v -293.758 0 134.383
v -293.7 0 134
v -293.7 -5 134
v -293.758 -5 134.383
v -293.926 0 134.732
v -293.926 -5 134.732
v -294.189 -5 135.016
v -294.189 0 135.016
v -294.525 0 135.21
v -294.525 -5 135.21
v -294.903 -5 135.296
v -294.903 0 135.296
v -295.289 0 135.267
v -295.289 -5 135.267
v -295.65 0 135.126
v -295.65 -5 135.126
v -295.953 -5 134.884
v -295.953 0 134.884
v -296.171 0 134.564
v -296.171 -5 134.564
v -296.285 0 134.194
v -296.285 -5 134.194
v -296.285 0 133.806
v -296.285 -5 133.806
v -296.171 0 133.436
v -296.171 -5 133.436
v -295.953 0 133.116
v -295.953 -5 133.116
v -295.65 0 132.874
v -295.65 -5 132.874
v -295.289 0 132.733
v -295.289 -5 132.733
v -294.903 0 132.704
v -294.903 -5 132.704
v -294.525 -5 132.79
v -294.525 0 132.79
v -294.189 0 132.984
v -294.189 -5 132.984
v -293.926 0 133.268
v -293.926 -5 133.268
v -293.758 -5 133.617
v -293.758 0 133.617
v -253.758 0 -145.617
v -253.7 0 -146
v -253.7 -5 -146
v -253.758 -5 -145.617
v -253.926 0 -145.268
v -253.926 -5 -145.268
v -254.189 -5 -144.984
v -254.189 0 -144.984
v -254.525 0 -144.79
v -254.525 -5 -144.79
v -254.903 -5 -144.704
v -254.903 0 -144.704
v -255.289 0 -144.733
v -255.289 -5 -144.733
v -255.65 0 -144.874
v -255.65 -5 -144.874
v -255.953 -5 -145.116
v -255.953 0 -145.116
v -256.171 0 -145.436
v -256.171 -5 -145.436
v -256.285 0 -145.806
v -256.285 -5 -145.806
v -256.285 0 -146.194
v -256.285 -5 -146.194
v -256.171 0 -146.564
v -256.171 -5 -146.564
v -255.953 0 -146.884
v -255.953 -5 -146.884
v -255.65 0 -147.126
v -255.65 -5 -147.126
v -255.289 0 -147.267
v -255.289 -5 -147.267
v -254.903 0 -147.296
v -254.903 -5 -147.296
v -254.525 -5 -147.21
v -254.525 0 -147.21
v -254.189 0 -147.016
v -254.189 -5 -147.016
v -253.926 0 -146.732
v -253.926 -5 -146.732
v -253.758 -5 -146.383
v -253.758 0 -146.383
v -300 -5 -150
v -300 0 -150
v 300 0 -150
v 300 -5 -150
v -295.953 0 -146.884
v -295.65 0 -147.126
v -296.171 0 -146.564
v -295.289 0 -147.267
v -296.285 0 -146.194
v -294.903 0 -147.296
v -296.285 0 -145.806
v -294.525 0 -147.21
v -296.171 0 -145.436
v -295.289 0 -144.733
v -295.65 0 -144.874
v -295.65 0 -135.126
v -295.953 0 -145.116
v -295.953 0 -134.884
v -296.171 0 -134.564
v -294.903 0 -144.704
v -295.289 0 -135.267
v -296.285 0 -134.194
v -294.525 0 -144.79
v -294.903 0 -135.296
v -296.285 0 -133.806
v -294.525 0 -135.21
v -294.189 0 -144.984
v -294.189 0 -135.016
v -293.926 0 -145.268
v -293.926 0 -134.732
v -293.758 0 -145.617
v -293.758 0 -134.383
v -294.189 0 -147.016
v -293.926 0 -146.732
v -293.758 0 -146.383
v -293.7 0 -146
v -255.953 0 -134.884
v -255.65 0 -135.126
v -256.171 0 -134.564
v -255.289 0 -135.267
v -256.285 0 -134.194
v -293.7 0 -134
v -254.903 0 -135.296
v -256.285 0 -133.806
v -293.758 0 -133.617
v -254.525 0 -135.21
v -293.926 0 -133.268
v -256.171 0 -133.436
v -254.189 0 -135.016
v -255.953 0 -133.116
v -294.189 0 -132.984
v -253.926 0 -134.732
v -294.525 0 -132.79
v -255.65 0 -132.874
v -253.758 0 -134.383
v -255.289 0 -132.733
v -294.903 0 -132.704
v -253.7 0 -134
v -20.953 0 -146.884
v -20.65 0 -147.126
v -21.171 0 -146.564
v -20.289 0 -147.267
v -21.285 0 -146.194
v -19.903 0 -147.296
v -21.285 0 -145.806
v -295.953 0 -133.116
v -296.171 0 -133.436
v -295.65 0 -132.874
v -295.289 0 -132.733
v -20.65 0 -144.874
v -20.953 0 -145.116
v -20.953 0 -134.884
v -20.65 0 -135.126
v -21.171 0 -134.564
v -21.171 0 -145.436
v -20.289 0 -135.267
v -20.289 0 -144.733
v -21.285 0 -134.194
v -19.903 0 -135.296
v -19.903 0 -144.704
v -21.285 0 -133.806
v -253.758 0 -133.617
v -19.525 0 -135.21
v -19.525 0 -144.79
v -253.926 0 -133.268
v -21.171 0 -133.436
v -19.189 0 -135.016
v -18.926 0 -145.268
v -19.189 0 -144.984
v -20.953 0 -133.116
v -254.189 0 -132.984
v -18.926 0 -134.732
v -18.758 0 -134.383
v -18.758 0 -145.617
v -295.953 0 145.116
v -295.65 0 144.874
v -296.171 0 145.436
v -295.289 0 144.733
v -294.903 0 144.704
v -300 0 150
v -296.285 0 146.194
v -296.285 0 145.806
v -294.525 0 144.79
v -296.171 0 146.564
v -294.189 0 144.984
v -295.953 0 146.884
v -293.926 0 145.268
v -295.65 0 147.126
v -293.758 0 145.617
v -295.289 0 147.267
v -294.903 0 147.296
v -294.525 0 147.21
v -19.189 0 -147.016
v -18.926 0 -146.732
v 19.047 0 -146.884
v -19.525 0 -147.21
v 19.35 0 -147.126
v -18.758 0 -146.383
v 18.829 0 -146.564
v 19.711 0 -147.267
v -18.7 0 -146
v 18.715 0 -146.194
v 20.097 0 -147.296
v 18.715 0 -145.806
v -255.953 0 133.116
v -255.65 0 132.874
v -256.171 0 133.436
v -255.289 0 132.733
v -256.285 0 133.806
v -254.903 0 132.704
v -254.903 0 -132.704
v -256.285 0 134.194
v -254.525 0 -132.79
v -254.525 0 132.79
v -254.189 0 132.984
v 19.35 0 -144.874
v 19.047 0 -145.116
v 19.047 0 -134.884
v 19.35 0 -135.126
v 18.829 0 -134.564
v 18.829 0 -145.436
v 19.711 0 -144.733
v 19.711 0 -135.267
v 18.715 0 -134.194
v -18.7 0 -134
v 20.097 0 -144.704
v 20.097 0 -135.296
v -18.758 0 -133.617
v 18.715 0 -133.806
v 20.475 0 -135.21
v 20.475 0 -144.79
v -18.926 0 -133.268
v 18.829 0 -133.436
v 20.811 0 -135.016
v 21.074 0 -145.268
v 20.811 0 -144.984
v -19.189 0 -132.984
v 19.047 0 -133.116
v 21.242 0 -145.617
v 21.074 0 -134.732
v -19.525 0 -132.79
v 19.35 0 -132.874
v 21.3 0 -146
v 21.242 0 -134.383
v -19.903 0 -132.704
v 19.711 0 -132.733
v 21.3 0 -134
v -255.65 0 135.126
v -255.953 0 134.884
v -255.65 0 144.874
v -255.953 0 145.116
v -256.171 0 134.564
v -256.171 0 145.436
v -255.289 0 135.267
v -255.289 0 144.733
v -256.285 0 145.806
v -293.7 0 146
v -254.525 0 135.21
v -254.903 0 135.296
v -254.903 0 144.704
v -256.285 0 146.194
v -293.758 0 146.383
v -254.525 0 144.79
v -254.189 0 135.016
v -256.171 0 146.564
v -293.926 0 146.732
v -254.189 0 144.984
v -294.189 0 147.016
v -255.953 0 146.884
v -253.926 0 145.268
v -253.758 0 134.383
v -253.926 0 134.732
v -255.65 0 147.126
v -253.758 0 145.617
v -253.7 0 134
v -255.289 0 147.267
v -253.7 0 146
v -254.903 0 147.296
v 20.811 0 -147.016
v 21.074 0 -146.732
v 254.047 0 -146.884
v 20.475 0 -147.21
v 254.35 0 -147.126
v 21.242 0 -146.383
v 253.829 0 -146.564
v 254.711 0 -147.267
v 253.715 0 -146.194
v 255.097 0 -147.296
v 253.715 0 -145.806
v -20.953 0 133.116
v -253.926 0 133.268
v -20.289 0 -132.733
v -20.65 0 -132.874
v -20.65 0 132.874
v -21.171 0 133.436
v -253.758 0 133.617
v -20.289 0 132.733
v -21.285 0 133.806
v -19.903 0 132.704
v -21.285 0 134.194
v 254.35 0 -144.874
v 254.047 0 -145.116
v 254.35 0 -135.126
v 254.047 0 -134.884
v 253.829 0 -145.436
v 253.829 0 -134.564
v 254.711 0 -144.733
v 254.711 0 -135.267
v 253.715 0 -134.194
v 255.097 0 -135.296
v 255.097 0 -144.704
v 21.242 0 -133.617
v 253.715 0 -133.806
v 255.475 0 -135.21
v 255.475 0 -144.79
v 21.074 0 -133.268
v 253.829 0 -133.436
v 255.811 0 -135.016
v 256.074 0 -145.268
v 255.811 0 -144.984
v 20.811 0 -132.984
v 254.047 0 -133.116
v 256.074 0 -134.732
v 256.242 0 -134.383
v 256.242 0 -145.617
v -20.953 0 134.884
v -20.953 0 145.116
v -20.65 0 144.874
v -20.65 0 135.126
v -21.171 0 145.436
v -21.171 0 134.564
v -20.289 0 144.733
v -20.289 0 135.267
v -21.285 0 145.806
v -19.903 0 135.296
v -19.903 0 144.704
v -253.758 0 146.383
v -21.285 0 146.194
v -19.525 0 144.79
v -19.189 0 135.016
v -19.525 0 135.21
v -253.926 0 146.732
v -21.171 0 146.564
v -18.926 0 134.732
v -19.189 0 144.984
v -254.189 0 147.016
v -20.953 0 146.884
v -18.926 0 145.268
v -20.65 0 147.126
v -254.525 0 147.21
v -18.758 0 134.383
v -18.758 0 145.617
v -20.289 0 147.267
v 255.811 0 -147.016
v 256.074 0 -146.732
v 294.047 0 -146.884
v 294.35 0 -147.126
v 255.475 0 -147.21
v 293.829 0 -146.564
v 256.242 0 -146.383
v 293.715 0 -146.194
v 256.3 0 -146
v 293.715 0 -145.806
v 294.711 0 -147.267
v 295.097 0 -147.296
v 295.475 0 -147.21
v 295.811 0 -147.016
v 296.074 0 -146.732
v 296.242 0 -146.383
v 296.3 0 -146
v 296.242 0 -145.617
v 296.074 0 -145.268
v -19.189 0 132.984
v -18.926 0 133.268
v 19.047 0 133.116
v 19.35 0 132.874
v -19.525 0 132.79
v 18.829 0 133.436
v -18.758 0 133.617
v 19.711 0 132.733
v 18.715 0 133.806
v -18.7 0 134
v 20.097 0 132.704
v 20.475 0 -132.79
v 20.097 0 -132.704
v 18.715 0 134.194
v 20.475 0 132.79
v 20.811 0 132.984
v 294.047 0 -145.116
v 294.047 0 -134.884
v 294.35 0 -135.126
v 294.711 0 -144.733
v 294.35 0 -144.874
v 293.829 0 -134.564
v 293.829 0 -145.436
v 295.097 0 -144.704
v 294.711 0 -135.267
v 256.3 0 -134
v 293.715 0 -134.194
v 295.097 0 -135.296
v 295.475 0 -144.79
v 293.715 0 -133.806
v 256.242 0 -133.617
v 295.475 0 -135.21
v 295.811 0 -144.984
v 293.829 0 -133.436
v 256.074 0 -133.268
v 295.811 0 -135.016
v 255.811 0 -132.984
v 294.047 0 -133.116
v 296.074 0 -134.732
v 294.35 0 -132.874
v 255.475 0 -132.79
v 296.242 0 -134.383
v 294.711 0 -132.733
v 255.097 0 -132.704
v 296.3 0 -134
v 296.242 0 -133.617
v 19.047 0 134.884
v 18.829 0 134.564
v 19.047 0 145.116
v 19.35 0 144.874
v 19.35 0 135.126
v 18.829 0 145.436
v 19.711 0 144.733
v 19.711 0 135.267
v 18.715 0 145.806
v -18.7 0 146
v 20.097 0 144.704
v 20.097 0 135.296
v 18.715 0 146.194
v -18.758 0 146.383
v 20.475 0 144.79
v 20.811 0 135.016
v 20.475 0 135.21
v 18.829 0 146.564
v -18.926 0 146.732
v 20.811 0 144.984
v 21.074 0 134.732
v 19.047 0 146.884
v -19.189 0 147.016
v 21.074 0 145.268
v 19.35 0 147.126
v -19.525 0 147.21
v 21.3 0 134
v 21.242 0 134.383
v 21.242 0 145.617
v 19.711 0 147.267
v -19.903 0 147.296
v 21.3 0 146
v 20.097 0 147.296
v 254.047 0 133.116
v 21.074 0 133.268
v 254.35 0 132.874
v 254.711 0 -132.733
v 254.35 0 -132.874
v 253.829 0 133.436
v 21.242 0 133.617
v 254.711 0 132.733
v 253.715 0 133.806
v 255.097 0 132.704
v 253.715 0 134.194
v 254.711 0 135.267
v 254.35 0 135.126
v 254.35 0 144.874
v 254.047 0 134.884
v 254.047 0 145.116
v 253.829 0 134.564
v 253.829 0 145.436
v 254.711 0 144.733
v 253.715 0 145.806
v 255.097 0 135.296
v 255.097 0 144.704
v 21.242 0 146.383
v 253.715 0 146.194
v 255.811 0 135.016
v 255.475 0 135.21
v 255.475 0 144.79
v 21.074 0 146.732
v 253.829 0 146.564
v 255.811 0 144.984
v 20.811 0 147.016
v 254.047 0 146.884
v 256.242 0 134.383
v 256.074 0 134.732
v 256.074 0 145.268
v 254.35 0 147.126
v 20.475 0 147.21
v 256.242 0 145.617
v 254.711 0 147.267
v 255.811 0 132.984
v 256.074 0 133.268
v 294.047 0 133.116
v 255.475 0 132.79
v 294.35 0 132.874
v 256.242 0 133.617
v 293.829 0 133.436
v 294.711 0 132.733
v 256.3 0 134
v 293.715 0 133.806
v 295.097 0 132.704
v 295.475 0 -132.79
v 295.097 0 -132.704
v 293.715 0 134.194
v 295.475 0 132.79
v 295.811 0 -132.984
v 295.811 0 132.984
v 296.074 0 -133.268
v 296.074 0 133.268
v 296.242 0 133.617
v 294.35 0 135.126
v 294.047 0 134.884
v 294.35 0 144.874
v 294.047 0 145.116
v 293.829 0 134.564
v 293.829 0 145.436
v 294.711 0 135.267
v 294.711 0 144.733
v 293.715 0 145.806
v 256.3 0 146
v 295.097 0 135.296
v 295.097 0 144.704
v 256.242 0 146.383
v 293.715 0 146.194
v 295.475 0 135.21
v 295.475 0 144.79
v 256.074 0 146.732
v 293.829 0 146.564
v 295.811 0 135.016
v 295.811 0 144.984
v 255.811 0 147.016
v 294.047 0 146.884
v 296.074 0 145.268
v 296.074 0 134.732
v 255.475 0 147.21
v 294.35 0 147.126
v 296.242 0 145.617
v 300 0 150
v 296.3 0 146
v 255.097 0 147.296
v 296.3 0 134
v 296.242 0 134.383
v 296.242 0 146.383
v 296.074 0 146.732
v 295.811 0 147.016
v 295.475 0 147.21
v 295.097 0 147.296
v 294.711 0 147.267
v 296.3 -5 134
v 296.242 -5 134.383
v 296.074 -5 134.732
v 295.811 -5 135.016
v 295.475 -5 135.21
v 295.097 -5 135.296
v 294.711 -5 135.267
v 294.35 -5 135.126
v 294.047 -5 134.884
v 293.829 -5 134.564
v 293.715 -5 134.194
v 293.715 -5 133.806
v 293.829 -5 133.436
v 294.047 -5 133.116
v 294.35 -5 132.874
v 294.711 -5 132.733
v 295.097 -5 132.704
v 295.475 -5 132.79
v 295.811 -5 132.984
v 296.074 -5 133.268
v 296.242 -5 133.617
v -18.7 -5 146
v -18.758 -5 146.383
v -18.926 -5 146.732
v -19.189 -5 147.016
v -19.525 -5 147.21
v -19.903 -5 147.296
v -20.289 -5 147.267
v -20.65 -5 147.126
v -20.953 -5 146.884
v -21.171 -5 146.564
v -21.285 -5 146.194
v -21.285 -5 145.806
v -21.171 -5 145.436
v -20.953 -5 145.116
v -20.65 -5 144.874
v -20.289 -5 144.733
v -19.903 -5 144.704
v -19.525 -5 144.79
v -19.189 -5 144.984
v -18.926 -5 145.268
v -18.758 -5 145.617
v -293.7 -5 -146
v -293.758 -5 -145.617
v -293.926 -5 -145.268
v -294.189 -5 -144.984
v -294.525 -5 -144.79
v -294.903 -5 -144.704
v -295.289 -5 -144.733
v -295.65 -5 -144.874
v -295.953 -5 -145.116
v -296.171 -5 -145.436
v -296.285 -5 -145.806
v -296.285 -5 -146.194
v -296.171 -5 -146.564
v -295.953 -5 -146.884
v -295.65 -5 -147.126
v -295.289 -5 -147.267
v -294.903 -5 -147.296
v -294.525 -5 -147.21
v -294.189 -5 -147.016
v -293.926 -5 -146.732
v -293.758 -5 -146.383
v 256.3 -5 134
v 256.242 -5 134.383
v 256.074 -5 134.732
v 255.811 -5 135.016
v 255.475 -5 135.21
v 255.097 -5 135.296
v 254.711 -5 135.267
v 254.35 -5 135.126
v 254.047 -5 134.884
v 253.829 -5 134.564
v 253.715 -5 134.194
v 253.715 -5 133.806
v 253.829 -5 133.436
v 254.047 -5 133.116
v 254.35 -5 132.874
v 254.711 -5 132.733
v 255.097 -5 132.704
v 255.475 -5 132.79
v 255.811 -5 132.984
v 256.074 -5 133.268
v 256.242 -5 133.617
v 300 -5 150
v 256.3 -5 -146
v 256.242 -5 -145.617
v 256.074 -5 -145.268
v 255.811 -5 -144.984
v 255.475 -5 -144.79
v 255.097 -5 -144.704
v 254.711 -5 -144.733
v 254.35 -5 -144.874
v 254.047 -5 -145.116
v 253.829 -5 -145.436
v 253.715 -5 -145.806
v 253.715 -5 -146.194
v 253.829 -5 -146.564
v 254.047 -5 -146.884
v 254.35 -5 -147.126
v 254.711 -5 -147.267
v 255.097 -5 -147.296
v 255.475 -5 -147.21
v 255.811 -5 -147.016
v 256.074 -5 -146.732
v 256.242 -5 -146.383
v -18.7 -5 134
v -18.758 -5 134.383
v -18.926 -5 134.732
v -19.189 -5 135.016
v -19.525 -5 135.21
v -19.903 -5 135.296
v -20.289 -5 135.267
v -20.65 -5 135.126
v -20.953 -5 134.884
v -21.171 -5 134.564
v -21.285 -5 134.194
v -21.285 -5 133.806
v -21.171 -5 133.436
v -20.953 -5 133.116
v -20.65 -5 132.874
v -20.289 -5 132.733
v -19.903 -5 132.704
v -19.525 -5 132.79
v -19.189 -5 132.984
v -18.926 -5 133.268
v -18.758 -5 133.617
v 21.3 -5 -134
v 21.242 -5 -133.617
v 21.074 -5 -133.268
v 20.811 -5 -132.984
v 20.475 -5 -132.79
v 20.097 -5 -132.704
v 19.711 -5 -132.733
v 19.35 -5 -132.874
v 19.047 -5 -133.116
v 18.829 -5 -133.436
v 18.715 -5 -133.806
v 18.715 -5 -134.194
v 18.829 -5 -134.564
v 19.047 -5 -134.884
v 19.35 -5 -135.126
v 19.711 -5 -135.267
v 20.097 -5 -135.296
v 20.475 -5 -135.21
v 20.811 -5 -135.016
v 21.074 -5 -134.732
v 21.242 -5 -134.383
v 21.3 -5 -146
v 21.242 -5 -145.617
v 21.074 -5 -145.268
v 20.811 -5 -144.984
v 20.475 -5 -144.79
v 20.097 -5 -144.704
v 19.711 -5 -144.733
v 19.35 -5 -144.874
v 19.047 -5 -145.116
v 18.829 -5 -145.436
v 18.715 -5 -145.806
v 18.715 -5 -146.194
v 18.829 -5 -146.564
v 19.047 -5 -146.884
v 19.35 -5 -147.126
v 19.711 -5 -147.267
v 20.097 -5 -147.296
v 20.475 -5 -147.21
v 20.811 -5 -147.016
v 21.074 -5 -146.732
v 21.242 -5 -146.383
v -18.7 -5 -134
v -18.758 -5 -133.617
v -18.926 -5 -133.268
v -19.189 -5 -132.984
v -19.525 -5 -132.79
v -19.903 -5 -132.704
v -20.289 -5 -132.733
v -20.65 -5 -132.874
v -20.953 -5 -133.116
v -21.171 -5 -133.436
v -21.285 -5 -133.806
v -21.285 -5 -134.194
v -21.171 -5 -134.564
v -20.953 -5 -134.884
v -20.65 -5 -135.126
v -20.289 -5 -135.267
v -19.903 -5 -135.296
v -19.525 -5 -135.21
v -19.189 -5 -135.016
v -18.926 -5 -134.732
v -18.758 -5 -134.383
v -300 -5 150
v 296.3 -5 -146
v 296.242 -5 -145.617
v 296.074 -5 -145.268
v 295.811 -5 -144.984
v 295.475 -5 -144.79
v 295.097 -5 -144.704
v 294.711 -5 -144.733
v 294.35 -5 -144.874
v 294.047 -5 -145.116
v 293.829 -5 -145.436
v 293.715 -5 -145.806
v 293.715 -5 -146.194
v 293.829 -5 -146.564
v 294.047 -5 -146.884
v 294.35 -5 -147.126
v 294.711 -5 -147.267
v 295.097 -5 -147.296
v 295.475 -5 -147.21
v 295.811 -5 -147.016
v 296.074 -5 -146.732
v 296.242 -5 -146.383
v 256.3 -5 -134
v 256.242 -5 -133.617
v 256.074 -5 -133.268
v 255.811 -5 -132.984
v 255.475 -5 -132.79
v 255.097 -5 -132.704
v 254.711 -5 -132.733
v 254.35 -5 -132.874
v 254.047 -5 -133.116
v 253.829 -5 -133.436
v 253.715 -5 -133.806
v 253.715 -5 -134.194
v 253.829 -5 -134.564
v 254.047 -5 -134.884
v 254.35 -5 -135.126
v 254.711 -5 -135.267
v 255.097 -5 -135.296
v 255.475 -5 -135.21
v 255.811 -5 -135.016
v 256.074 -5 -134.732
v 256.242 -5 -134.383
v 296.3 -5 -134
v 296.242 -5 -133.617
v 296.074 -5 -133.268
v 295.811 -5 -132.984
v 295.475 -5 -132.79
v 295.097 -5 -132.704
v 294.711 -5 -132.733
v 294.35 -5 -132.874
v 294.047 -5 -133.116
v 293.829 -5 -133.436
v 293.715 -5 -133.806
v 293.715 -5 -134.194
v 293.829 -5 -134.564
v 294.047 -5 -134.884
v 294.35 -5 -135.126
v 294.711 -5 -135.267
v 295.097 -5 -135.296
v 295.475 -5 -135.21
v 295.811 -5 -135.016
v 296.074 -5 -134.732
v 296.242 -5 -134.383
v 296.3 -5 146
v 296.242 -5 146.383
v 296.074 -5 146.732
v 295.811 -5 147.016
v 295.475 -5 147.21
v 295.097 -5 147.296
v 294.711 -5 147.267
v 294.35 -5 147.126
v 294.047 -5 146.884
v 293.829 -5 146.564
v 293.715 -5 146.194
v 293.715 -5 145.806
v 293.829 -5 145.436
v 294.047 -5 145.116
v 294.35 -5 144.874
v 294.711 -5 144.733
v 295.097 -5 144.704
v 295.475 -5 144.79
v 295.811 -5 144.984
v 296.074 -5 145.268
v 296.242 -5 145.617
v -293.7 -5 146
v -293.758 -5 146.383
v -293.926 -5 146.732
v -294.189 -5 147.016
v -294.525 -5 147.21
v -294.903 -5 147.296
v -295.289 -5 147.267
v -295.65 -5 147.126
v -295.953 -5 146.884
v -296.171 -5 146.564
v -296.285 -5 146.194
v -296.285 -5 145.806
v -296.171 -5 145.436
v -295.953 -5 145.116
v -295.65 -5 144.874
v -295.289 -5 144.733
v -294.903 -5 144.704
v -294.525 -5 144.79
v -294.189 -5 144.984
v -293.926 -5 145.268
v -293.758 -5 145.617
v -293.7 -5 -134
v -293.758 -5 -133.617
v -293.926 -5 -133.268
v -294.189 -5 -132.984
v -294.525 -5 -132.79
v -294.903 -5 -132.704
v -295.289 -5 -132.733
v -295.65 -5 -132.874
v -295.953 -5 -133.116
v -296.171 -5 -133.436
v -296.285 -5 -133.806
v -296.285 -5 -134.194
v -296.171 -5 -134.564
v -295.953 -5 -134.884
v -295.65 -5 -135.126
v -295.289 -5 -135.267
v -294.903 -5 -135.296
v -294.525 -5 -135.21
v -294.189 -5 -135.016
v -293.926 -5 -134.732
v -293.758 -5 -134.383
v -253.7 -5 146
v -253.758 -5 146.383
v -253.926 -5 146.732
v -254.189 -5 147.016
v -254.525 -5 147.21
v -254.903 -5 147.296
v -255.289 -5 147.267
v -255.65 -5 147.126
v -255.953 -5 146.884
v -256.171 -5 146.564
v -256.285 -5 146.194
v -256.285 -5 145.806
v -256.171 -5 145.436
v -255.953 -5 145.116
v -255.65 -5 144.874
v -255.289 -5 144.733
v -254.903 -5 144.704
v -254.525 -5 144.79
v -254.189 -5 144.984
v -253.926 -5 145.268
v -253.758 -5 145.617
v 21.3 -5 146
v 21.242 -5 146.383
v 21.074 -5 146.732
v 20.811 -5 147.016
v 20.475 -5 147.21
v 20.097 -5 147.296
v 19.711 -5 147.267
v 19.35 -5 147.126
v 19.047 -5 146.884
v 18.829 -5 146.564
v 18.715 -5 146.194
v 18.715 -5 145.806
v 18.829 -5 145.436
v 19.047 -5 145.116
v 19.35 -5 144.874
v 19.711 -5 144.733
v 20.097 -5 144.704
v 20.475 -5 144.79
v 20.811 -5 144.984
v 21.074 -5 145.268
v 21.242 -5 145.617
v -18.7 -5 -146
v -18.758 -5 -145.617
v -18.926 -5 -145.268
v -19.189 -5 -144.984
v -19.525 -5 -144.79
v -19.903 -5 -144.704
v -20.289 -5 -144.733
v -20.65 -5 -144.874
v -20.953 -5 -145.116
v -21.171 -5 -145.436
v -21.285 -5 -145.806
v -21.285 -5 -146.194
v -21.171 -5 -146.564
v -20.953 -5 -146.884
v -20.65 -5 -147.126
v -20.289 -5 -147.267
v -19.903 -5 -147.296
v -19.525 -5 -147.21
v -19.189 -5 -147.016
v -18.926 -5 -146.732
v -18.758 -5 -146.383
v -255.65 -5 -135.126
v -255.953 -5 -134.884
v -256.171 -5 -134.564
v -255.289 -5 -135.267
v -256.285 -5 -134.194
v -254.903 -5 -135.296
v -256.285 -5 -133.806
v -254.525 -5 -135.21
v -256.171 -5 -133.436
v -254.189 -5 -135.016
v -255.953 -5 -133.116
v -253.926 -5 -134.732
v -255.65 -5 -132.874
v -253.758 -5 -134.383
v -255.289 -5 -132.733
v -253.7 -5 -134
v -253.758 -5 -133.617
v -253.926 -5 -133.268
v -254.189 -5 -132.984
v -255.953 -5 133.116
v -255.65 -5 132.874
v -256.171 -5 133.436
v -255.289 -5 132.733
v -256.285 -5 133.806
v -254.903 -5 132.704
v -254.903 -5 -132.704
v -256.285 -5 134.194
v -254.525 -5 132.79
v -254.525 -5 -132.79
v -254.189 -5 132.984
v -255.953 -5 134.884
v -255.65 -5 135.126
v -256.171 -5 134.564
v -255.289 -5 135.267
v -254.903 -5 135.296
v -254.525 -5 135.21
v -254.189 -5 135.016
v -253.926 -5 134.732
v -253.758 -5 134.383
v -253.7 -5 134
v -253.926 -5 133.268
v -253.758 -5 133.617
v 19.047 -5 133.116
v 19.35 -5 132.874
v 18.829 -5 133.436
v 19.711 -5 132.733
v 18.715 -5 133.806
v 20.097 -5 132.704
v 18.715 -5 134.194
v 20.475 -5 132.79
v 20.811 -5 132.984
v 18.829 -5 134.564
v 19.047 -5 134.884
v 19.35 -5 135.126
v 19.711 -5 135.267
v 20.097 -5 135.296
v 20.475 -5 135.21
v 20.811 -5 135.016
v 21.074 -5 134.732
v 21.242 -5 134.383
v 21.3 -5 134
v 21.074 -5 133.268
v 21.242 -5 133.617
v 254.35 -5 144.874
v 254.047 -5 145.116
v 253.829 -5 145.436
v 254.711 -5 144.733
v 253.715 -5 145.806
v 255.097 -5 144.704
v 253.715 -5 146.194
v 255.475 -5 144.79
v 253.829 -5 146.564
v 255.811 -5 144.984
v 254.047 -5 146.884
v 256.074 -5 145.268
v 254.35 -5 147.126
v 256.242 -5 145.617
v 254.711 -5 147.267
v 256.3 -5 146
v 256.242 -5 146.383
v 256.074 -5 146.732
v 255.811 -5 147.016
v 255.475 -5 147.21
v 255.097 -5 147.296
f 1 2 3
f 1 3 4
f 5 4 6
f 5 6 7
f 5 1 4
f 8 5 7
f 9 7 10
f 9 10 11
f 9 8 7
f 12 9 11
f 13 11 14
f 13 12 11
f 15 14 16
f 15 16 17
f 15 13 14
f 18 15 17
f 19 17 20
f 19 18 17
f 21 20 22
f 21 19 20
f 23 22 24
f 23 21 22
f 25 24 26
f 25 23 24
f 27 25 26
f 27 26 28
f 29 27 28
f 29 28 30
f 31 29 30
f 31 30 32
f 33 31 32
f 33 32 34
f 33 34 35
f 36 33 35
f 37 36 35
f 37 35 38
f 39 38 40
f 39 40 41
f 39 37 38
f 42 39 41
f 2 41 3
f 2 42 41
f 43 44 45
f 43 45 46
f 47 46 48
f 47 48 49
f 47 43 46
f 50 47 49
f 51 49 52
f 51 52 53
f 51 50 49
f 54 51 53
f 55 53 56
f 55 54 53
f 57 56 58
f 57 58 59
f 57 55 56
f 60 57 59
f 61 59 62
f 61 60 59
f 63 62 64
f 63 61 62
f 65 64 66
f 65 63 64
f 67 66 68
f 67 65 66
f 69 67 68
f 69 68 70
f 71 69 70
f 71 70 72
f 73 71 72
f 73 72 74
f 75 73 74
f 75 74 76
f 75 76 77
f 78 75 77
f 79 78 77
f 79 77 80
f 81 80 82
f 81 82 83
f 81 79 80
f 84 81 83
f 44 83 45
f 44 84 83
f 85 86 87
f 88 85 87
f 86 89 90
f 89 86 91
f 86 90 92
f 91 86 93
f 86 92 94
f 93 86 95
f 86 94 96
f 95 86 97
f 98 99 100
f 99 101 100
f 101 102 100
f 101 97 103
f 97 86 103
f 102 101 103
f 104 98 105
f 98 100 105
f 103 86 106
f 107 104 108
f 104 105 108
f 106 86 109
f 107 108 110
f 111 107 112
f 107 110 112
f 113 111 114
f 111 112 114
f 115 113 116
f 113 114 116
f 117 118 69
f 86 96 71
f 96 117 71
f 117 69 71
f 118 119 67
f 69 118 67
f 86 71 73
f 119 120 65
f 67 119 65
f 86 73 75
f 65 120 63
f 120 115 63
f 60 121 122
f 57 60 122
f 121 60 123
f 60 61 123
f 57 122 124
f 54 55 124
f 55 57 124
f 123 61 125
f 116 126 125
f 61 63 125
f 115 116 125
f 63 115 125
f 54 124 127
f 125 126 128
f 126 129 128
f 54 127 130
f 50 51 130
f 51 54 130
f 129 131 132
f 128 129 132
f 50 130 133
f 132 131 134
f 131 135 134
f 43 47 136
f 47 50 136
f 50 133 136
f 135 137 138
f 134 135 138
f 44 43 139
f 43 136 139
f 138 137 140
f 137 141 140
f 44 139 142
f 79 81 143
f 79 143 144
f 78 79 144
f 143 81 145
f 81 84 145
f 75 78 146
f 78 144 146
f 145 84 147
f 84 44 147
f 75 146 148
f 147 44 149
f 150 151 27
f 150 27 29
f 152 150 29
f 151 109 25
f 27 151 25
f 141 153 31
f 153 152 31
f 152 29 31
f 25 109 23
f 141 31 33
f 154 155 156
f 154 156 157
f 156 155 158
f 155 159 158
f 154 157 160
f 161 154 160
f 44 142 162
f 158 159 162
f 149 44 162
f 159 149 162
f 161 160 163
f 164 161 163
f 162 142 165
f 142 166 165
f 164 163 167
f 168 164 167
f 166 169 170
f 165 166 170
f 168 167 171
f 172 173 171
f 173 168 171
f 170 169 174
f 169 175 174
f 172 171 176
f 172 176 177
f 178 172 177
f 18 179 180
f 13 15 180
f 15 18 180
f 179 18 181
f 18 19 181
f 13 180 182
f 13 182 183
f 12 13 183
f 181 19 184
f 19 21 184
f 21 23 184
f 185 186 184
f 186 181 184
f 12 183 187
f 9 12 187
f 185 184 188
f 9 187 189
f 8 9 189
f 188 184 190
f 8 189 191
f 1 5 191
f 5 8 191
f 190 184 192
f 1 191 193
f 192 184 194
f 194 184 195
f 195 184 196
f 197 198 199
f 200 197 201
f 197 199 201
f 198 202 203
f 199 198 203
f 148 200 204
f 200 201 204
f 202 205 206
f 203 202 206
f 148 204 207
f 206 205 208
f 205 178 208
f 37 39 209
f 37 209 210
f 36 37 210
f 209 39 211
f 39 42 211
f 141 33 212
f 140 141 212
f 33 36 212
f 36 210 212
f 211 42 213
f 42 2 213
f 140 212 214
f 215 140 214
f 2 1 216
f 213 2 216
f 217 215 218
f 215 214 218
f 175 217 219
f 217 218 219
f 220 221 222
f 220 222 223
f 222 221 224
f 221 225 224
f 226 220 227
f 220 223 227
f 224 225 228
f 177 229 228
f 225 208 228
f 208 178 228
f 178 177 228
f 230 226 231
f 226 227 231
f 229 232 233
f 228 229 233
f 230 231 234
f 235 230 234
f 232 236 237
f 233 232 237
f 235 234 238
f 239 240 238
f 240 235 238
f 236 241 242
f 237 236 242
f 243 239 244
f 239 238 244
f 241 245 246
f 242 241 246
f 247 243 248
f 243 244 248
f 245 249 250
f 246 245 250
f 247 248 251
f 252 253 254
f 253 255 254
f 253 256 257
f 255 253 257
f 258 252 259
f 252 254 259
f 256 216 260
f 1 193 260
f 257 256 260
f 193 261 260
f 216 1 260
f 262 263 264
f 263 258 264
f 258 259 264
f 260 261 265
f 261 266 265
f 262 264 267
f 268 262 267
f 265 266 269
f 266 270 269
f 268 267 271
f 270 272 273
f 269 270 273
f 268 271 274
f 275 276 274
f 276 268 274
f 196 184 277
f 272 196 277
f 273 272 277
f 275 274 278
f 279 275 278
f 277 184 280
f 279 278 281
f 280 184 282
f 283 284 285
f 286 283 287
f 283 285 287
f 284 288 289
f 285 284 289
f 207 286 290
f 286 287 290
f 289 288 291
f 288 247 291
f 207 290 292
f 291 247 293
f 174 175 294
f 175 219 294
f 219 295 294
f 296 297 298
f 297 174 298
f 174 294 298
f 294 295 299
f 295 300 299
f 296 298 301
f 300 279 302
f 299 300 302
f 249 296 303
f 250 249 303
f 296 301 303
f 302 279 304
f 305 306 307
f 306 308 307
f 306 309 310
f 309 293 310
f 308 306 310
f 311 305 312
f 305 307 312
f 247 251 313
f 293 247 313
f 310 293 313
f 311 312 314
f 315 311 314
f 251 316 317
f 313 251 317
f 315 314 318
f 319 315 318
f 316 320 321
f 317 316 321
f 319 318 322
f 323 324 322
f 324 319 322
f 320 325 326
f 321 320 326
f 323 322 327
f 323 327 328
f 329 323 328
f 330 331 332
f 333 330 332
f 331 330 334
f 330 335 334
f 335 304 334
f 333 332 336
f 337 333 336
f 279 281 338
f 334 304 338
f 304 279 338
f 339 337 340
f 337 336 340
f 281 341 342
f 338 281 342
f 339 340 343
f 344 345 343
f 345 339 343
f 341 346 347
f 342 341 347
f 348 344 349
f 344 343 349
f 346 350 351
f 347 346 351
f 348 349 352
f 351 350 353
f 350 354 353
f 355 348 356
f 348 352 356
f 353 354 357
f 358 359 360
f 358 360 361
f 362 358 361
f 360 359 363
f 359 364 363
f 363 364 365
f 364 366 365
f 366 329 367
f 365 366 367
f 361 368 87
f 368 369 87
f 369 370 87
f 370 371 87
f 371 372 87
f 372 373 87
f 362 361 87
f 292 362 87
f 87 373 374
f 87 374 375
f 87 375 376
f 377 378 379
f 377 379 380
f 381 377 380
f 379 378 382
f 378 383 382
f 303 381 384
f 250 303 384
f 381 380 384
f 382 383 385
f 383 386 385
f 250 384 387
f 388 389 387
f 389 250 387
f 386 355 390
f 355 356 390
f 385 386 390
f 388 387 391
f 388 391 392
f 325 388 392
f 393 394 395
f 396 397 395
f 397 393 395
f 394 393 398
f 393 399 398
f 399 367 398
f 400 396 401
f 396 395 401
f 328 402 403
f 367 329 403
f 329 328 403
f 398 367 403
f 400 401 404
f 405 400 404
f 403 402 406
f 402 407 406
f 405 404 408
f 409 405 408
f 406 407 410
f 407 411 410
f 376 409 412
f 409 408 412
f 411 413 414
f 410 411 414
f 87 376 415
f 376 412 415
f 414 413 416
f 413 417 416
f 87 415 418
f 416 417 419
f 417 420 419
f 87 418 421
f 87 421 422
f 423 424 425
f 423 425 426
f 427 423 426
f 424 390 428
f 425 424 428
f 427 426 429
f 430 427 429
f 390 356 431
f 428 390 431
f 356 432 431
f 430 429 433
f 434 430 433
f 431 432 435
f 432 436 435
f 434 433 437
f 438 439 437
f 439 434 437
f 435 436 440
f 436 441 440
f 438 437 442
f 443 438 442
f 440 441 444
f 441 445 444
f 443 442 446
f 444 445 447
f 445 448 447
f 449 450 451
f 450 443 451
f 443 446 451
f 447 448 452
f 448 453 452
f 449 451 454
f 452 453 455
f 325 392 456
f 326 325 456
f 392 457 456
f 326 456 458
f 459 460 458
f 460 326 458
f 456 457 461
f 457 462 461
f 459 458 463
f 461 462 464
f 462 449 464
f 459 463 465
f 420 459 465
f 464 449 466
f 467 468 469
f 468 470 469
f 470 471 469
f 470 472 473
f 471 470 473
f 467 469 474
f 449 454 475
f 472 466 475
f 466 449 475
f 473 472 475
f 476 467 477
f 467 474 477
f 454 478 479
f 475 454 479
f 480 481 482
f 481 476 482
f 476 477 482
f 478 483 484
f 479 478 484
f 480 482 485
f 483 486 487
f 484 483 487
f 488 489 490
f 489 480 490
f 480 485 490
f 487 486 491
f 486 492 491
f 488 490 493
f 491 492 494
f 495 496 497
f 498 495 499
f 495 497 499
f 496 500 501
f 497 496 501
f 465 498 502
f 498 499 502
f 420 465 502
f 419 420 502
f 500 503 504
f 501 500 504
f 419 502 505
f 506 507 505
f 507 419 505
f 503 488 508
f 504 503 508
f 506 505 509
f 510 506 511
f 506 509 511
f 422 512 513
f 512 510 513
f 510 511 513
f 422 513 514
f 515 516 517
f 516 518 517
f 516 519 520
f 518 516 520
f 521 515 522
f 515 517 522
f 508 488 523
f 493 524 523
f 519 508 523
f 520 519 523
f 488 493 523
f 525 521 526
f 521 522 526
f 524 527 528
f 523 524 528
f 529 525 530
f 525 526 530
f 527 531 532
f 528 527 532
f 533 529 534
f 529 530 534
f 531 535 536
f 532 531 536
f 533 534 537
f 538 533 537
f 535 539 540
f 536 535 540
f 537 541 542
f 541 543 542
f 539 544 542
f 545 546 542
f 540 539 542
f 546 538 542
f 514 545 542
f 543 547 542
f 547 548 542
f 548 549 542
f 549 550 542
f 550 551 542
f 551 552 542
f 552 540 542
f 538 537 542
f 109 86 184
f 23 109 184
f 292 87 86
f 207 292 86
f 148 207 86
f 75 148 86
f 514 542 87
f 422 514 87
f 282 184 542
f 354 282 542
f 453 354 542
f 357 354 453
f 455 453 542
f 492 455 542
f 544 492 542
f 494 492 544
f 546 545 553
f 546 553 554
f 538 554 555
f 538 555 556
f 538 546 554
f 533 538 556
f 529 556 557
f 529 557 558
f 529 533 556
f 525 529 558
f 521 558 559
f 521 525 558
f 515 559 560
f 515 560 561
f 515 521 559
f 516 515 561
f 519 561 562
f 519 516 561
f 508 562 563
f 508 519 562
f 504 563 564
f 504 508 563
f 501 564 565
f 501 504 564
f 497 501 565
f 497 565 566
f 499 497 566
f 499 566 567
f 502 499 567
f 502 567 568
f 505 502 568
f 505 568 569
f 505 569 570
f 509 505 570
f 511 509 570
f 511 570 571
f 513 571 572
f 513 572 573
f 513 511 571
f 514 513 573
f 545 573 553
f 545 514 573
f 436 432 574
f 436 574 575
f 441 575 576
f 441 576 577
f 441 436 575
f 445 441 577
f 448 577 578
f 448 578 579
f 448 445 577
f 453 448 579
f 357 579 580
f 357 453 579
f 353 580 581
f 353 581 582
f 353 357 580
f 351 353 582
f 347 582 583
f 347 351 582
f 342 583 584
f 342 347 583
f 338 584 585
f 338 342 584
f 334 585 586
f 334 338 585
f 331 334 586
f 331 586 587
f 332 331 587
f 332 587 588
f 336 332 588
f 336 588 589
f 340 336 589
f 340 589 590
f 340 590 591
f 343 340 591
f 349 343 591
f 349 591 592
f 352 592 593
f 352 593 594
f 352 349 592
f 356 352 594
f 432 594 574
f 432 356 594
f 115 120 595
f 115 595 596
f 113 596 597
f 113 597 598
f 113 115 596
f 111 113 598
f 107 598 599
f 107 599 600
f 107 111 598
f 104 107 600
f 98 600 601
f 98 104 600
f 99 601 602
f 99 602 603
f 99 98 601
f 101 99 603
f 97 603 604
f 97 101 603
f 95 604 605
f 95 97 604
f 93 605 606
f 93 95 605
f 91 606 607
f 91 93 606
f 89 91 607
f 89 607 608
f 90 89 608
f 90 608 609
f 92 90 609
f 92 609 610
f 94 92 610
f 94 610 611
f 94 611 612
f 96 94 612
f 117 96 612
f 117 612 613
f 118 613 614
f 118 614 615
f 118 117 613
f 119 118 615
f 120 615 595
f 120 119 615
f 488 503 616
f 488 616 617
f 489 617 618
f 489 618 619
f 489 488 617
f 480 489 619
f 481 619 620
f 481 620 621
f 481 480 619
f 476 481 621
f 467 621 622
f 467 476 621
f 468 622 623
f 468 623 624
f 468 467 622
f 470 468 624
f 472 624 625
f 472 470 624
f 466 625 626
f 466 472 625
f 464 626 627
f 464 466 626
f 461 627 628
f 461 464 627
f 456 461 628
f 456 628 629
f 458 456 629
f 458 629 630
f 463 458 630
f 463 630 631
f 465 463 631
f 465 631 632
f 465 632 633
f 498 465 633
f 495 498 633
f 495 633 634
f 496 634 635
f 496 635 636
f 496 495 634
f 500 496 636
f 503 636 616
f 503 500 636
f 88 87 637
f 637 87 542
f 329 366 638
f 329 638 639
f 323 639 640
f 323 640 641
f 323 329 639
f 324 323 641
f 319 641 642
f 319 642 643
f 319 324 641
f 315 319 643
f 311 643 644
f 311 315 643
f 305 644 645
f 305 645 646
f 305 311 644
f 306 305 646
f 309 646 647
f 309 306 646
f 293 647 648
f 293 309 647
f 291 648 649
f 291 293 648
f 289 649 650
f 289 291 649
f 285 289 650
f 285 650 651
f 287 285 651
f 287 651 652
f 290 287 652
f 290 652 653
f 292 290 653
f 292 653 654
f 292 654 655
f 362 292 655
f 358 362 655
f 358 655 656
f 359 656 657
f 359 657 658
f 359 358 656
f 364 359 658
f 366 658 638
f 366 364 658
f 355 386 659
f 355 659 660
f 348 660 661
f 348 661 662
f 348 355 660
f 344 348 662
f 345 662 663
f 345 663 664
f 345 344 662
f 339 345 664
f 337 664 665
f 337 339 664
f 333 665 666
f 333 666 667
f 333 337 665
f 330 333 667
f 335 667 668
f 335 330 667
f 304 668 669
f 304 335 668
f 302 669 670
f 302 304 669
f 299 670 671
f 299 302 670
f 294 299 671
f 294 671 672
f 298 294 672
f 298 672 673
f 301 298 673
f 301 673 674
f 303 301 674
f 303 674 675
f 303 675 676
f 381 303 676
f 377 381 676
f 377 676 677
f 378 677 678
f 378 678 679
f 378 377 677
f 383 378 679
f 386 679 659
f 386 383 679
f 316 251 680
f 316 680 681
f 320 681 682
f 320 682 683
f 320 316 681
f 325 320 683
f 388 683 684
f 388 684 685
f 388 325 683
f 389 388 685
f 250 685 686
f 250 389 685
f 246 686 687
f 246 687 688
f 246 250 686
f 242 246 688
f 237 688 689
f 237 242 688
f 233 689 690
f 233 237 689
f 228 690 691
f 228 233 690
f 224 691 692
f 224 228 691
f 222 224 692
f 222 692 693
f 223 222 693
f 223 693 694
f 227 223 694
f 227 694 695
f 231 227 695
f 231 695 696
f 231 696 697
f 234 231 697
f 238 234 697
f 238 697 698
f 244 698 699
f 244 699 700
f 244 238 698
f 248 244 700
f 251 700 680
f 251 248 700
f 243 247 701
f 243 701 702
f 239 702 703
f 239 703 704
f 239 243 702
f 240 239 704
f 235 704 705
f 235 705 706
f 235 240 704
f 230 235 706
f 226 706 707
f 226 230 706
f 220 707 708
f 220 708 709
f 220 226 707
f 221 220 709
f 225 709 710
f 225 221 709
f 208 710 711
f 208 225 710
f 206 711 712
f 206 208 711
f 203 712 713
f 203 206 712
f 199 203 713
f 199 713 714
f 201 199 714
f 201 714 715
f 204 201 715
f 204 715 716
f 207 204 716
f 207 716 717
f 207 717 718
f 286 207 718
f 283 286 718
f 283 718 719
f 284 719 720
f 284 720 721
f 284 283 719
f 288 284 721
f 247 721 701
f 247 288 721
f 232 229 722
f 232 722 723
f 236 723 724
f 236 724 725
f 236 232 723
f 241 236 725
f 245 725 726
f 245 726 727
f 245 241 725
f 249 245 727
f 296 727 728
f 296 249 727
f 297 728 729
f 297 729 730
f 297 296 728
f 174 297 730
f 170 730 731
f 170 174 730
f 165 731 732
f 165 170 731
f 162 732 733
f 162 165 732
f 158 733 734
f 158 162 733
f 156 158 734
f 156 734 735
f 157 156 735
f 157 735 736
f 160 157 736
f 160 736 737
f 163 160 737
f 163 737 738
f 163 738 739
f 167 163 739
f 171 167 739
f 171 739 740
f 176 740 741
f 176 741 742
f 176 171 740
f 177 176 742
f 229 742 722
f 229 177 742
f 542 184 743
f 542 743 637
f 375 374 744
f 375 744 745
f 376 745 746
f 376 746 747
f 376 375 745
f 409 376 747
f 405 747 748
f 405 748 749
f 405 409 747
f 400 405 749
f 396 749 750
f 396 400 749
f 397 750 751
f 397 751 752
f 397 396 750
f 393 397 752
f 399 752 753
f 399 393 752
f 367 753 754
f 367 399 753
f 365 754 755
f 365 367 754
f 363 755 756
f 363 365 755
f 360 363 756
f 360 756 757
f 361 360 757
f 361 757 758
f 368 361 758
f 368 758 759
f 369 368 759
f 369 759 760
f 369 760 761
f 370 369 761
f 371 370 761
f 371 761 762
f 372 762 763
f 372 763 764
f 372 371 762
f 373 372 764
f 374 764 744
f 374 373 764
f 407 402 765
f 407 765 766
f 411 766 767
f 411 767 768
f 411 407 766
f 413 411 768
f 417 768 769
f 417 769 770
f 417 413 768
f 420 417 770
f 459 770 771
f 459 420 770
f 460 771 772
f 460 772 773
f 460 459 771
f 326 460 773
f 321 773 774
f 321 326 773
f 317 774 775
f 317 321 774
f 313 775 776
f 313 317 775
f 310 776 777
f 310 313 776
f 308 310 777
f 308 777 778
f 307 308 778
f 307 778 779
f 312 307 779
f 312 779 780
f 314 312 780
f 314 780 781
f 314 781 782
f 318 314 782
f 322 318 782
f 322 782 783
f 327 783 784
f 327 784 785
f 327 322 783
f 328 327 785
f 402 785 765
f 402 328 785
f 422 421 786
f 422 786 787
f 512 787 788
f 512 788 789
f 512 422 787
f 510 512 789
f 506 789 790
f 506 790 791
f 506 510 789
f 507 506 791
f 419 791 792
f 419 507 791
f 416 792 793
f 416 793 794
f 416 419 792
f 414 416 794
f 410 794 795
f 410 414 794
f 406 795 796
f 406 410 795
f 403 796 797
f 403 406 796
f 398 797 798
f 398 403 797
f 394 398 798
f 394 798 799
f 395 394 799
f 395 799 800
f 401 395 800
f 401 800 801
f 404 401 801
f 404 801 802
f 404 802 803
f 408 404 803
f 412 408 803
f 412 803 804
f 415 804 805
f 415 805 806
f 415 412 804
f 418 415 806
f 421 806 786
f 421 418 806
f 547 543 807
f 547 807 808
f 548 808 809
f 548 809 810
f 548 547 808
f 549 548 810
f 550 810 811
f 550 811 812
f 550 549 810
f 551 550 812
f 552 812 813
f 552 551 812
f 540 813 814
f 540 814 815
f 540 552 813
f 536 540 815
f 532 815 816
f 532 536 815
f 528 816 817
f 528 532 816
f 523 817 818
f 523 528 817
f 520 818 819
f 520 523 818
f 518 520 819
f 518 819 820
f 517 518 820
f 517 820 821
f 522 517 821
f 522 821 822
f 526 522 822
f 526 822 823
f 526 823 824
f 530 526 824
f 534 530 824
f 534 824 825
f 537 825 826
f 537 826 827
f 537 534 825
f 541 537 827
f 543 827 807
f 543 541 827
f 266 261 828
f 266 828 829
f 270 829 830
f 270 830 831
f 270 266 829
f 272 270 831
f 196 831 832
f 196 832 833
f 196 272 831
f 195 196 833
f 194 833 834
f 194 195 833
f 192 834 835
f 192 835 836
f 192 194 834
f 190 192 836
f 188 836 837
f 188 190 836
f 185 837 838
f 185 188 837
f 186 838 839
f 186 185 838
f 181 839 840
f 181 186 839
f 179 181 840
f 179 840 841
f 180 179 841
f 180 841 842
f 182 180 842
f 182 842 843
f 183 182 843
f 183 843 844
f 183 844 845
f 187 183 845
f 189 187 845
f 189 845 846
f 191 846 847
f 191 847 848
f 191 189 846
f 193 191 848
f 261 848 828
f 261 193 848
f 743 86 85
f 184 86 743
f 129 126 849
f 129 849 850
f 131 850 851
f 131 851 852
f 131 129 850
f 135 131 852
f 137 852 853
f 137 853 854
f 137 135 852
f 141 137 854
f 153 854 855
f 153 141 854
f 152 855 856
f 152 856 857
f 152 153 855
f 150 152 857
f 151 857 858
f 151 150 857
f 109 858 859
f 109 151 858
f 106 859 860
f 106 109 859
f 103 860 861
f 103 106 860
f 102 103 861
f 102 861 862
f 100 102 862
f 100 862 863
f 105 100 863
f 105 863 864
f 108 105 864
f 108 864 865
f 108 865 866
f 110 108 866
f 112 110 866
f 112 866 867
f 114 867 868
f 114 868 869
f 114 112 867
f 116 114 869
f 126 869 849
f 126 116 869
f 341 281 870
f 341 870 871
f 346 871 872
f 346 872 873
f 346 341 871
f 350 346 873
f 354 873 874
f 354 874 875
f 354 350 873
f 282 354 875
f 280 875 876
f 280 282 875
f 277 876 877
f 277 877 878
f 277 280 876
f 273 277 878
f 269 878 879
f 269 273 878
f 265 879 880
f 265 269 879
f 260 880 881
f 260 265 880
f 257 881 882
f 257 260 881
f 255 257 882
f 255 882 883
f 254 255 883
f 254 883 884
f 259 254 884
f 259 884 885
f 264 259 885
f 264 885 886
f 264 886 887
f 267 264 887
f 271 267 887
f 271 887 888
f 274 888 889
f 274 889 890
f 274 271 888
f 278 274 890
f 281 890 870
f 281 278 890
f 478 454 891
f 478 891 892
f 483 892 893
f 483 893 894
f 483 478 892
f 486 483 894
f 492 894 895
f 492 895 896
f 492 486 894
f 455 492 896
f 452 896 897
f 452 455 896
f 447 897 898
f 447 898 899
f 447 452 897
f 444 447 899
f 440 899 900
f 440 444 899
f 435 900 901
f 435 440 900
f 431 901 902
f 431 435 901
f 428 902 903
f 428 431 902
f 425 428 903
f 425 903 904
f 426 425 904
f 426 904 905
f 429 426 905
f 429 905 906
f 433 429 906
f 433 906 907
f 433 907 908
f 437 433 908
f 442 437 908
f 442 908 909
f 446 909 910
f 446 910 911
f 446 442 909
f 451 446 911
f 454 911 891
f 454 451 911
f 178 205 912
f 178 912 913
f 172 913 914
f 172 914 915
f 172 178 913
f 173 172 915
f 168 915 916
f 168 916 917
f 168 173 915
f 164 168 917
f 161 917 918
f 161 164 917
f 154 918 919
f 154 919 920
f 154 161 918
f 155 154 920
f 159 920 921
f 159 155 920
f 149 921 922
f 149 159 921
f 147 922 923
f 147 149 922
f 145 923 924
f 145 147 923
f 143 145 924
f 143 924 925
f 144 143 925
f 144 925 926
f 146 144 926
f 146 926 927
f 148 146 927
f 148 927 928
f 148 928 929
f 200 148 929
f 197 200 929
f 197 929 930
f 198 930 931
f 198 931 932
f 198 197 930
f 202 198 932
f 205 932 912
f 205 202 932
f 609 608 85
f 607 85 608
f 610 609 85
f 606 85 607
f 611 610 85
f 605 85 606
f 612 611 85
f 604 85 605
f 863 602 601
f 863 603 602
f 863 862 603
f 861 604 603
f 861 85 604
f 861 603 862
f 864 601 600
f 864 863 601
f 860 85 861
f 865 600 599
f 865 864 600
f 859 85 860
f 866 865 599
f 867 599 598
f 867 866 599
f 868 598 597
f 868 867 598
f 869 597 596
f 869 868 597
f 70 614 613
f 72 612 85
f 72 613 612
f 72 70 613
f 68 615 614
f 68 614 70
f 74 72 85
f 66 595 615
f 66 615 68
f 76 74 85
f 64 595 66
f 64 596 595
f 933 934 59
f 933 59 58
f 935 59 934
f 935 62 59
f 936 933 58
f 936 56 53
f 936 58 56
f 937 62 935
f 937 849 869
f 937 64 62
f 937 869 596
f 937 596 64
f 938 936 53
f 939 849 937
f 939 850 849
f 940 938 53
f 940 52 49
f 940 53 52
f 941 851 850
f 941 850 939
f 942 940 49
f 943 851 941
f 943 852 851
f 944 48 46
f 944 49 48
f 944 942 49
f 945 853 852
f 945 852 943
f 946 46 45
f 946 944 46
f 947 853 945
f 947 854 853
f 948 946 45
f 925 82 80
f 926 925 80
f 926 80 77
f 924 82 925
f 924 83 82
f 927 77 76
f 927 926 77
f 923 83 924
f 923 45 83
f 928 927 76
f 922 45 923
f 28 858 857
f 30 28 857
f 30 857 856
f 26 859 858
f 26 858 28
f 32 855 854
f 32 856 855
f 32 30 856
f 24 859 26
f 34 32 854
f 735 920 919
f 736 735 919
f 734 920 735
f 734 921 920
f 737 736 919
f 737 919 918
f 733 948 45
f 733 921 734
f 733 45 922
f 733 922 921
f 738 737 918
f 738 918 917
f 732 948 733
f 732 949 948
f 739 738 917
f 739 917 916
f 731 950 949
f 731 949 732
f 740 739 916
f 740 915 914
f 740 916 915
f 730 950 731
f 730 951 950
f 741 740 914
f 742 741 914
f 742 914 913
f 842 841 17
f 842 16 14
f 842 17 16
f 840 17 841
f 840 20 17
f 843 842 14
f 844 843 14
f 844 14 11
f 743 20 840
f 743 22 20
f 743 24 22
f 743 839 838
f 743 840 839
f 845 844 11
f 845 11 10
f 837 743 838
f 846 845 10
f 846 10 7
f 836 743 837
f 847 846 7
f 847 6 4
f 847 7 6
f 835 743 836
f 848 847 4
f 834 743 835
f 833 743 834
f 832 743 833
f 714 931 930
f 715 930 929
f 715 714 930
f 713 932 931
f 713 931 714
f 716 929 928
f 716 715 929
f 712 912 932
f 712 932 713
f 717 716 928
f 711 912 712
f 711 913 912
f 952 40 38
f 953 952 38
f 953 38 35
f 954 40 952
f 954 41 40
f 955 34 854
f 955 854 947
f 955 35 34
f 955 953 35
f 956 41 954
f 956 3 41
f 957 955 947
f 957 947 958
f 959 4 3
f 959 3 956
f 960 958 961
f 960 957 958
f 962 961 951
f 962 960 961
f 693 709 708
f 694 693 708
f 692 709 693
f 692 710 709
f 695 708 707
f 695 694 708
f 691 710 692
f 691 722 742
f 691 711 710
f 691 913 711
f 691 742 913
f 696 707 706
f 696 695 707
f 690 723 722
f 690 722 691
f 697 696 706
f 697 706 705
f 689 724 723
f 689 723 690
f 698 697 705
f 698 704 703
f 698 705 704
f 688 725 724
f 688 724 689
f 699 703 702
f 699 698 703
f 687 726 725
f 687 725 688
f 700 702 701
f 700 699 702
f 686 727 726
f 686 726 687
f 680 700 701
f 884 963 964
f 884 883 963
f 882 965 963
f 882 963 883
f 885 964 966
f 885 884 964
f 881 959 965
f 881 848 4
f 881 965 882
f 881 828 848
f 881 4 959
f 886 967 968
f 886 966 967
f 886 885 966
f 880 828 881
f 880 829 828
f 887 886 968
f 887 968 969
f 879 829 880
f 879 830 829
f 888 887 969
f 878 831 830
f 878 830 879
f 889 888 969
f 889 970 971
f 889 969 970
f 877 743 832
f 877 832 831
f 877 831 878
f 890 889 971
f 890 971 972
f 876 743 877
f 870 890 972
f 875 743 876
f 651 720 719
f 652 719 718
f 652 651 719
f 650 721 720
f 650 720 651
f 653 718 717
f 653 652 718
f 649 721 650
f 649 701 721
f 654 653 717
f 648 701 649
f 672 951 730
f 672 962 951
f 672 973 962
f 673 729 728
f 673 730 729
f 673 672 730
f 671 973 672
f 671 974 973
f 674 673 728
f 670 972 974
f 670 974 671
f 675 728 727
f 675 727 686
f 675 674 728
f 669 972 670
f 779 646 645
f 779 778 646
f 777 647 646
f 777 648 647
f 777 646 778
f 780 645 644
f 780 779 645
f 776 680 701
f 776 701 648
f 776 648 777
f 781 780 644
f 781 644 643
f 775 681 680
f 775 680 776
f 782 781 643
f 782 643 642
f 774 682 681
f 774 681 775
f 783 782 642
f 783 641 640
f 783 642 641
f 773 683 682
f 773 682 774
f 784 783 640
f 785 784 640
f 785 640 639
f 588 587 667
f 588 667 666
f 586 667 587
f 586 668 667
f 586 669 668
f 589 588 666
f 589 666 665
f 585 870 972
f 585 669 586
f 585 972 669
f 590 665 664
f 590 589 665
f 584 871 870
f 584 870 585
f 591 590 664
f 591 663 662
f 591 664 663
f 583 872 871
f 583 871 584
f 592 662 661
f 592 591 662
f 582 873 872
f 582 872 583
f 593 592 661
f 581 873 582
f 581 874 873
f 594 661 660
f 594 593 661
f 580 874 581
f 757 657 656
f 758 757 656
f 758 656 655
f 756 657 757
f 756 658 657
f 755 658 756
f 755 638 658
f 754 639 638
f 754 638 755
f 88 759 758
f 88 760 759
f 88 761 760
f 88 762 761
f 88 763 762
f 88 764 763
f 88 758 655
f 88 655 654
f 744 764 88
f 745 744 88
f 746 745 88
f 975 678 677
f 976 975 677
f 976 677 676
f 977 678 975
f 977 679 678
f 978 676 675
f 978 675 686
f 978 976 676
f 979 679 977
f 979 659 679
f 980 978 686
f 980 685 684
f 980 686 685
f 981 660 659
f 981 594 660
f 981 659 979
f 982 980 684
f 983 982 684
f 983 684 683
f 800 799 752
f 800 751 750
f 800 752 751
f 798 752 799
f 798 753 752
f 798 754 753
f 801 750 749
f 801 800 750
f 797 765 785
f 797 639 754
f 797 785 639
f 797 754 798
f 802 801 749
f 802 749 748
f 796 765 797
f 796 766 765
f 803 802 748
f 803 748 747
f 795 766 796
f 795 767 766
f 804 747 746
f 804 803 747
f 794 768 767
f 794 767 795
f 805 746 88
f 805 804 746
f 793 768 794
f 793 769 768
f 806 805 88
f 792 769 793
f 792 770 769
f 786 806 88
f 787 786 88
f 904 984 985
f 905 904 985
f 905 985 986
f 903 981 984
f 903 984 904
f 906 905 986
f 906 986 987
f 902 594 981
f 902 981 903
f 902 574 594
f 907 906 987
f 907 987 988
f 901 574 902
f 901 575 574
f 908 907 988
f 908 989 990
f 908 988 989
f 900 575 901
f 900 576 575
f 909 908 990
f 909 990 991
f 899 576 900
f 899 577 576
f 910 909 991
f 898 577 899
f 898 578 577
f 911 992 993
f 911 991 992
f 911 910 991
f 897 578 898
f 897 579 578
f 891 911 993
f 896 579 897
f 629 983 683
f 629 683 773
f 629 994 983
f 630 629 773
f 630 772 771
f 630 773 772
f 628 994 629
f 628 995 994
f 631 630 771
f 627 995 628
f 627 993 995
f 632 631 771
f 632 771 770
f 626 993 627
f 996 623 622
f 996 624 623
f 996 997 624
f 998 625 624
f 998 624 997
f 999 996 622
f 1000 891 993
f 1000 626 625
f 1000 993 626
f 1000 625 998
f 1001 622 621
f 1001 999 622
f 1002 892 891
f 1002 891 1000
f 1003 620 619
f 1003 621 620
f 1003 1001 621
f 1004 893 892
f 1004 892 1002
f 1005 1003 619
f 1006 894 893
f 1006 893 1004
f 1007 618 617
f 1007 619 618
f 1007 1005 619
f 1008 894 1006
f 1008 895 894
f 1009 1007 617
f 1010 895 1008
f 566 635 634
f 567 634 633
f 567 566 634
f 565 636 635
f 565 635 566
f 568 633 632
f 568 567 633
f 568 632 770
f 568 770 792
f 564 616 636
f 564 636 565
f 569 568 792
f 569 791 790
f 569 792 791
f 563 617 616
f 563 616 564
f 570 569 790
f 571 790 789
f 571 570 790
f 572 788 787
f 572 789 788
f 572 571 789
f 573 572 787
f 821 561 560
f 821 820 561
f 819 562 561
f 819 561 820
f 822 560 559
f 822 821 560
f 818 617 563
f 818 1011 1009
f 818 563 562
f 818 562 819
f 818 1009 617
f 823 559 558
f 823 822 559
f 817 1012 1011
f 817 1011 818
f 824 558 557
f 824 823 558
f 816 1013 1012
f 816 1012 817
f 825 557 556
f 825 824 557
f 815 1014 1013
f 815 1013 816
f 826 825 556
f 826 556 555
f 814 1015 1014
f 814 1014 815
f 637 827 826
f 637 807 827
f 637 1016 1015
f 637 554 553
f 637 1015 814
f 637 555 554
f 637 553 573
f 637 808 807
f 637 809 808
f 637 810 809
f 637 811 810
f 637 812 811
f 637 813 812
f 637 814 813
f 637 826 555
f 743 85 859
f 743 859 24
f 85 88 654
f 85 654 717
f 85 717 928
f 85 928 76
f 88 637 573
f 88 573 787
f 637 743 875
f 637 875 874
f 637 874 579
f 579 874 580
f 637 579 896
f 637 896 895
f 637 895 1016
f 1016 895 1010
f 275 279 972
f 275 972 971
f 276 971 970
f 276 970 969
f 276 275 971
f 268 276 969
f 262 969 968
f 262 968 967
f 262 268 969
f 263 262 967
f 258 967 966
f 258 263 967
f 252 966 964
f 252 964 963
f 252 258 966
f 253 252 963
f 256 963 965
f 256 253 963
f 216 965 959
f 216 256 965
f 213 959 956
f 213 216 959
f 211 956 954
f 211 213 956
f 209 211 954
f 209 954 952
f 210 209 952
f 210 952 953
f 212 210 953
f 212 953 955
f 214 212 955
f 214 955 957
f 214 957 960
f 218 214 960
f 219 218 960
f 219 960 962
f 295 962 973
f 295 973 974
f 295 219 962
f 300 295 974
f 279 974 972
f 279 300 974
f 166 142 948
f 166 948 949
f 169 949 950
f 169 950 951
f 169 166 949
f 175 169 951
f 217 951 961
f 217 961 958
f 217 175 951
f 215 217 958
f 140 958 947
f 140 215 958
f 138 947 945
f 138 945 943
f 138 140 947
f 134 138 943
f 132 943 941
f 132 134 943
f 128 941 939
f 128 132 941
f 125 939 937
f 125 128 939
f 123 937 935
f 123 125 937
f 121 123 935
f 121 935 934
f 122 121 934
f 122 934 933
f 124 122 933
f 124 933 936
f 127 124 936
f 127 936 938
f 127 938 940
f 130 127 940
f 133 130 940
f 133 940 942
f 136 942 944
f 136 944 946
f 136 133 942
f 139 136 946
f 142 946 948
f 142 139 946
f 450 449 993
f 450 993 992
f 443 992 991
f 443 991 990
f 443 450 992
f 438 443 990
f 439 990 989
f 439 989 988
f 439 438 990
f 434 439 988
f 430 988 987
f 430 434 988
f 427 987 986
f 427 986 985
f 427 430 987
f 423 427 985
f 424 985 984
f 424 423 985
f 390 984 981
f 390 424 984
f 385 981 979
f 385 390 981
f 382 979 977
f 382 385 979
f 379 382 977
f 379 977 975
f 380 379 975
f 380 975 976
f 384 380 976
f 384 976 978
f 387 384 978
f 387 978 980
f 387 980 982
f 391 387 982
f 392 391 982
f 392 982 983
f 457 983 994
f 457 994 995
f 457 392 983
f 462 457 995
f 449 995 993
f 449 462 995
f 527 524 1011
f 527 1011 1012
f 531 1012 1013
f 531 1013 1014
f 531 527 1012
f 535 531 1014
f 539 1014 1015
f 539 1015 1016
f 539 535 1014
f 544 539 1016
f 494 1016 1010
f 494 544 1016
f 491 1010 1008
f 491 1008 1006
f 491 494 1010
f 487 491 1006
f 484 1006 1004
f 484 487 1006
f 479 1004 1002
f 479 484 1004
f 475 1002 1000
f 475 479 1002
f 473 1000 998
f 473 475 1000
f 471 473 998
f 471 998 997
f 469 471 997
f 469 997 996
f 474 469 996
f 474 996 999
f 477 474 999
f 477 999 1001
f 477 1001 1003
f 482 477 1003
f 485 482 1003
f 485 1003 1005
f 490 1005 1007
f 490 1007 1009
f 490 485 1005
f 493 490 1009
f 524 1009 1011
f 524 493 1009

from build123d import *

# Parameters (mm, degrees)
F0_W     = 600
F0_H     = 300
F0_R     = 1.3
F1_DEPTH = 5


with BuildPart() as f1:
    # F0 (on Front) → F1 (new body)
    with BuildSketch(Plane.XZ):
        Rectangle(F0_W, F0_H)
        with Locations((-295, -146)):
            Circle(F0_R, mode=Mode.SUBTRACT)
        with Locations((-295, -134)):
            Circle(F0_R, mode=Mode.SUBTRACT)
        with Locations((-255, -146)):
            Circle(F0_R, mode=Mode.SUBTRACT)
        with Locations((-255, -134)):
            Circle(F0_R, mode=Mode.SUBTRACT)
        with Locations((-20, -146)):
            Circle(F0_R, mode=Mode.SUBTRACT)
        with Locations((-20, -134)):
            Circle(F0_R, mode=Mode.SUBTRACT)
        with Locations((20, -146)):
            Circle(F0_R, mode=Mode.SUBTRACT)
        with Locations((20, -134)):
            Circle(F0_R, mode=Mode.SUBTRACT)
        with Locations((255, -146)):
            Circle(F0_R, mode=Mode.SUBTRACT)
        with Locations((255, -134)):
            Circle(F0_R, mode=Mode.SUBTRACT)
        with Locations((295, -146)):
            Circle(F0_R, mode=Mode.SUBTRACT)
        with Locations((295, -134)):
            Circle(F0_R, mode=Mode.SUBTRACT)
        with Locations((-295, 134)):
            Circle(F0_R, mode=Mode.SUBTRACT)
        with Locations((-295, 146)):
            Circle(F0_R, mode=Mode.SUBTRACT)
        with Locations((-255, 134)):
            Circle(F0_R, mode=Mode.SUBTRACT)
        with Locations((-255, 146)):
            Circle(F0_R, mode=Mode.SUBTRACT)
        with Locations((-20, 134)):
            Circle(F0_R, mode=Mode.SUBTRACT)
        with Locations((-20, 146)):
            Circle(F0_R, mode=Mode.SUBTRACT)
        with Locations((20, 134)):
            Circle(F0_R, mode=Mode.SUBTRACT)
        with Locations((20, 146)):
            Circle(F0_R, mode=Mode.SUBTRACT)
        with Locations((255, 134)):
            Circle(F0_R, mode=Mode.SUBTRACT)
        with Locations((255, 146)):
            Circle(F0_R, mode=Mode.SUBTRACT)
        with Locations((295, 134)):
            Circle(F0_R, mode=Mode.SUBTRACT)
        with Locations((295, 146)):
            Circle(F0_R, mode=Mode.SUBTRACT)
    extrude(amount=F1_DEPTH)


solid = f1.part
